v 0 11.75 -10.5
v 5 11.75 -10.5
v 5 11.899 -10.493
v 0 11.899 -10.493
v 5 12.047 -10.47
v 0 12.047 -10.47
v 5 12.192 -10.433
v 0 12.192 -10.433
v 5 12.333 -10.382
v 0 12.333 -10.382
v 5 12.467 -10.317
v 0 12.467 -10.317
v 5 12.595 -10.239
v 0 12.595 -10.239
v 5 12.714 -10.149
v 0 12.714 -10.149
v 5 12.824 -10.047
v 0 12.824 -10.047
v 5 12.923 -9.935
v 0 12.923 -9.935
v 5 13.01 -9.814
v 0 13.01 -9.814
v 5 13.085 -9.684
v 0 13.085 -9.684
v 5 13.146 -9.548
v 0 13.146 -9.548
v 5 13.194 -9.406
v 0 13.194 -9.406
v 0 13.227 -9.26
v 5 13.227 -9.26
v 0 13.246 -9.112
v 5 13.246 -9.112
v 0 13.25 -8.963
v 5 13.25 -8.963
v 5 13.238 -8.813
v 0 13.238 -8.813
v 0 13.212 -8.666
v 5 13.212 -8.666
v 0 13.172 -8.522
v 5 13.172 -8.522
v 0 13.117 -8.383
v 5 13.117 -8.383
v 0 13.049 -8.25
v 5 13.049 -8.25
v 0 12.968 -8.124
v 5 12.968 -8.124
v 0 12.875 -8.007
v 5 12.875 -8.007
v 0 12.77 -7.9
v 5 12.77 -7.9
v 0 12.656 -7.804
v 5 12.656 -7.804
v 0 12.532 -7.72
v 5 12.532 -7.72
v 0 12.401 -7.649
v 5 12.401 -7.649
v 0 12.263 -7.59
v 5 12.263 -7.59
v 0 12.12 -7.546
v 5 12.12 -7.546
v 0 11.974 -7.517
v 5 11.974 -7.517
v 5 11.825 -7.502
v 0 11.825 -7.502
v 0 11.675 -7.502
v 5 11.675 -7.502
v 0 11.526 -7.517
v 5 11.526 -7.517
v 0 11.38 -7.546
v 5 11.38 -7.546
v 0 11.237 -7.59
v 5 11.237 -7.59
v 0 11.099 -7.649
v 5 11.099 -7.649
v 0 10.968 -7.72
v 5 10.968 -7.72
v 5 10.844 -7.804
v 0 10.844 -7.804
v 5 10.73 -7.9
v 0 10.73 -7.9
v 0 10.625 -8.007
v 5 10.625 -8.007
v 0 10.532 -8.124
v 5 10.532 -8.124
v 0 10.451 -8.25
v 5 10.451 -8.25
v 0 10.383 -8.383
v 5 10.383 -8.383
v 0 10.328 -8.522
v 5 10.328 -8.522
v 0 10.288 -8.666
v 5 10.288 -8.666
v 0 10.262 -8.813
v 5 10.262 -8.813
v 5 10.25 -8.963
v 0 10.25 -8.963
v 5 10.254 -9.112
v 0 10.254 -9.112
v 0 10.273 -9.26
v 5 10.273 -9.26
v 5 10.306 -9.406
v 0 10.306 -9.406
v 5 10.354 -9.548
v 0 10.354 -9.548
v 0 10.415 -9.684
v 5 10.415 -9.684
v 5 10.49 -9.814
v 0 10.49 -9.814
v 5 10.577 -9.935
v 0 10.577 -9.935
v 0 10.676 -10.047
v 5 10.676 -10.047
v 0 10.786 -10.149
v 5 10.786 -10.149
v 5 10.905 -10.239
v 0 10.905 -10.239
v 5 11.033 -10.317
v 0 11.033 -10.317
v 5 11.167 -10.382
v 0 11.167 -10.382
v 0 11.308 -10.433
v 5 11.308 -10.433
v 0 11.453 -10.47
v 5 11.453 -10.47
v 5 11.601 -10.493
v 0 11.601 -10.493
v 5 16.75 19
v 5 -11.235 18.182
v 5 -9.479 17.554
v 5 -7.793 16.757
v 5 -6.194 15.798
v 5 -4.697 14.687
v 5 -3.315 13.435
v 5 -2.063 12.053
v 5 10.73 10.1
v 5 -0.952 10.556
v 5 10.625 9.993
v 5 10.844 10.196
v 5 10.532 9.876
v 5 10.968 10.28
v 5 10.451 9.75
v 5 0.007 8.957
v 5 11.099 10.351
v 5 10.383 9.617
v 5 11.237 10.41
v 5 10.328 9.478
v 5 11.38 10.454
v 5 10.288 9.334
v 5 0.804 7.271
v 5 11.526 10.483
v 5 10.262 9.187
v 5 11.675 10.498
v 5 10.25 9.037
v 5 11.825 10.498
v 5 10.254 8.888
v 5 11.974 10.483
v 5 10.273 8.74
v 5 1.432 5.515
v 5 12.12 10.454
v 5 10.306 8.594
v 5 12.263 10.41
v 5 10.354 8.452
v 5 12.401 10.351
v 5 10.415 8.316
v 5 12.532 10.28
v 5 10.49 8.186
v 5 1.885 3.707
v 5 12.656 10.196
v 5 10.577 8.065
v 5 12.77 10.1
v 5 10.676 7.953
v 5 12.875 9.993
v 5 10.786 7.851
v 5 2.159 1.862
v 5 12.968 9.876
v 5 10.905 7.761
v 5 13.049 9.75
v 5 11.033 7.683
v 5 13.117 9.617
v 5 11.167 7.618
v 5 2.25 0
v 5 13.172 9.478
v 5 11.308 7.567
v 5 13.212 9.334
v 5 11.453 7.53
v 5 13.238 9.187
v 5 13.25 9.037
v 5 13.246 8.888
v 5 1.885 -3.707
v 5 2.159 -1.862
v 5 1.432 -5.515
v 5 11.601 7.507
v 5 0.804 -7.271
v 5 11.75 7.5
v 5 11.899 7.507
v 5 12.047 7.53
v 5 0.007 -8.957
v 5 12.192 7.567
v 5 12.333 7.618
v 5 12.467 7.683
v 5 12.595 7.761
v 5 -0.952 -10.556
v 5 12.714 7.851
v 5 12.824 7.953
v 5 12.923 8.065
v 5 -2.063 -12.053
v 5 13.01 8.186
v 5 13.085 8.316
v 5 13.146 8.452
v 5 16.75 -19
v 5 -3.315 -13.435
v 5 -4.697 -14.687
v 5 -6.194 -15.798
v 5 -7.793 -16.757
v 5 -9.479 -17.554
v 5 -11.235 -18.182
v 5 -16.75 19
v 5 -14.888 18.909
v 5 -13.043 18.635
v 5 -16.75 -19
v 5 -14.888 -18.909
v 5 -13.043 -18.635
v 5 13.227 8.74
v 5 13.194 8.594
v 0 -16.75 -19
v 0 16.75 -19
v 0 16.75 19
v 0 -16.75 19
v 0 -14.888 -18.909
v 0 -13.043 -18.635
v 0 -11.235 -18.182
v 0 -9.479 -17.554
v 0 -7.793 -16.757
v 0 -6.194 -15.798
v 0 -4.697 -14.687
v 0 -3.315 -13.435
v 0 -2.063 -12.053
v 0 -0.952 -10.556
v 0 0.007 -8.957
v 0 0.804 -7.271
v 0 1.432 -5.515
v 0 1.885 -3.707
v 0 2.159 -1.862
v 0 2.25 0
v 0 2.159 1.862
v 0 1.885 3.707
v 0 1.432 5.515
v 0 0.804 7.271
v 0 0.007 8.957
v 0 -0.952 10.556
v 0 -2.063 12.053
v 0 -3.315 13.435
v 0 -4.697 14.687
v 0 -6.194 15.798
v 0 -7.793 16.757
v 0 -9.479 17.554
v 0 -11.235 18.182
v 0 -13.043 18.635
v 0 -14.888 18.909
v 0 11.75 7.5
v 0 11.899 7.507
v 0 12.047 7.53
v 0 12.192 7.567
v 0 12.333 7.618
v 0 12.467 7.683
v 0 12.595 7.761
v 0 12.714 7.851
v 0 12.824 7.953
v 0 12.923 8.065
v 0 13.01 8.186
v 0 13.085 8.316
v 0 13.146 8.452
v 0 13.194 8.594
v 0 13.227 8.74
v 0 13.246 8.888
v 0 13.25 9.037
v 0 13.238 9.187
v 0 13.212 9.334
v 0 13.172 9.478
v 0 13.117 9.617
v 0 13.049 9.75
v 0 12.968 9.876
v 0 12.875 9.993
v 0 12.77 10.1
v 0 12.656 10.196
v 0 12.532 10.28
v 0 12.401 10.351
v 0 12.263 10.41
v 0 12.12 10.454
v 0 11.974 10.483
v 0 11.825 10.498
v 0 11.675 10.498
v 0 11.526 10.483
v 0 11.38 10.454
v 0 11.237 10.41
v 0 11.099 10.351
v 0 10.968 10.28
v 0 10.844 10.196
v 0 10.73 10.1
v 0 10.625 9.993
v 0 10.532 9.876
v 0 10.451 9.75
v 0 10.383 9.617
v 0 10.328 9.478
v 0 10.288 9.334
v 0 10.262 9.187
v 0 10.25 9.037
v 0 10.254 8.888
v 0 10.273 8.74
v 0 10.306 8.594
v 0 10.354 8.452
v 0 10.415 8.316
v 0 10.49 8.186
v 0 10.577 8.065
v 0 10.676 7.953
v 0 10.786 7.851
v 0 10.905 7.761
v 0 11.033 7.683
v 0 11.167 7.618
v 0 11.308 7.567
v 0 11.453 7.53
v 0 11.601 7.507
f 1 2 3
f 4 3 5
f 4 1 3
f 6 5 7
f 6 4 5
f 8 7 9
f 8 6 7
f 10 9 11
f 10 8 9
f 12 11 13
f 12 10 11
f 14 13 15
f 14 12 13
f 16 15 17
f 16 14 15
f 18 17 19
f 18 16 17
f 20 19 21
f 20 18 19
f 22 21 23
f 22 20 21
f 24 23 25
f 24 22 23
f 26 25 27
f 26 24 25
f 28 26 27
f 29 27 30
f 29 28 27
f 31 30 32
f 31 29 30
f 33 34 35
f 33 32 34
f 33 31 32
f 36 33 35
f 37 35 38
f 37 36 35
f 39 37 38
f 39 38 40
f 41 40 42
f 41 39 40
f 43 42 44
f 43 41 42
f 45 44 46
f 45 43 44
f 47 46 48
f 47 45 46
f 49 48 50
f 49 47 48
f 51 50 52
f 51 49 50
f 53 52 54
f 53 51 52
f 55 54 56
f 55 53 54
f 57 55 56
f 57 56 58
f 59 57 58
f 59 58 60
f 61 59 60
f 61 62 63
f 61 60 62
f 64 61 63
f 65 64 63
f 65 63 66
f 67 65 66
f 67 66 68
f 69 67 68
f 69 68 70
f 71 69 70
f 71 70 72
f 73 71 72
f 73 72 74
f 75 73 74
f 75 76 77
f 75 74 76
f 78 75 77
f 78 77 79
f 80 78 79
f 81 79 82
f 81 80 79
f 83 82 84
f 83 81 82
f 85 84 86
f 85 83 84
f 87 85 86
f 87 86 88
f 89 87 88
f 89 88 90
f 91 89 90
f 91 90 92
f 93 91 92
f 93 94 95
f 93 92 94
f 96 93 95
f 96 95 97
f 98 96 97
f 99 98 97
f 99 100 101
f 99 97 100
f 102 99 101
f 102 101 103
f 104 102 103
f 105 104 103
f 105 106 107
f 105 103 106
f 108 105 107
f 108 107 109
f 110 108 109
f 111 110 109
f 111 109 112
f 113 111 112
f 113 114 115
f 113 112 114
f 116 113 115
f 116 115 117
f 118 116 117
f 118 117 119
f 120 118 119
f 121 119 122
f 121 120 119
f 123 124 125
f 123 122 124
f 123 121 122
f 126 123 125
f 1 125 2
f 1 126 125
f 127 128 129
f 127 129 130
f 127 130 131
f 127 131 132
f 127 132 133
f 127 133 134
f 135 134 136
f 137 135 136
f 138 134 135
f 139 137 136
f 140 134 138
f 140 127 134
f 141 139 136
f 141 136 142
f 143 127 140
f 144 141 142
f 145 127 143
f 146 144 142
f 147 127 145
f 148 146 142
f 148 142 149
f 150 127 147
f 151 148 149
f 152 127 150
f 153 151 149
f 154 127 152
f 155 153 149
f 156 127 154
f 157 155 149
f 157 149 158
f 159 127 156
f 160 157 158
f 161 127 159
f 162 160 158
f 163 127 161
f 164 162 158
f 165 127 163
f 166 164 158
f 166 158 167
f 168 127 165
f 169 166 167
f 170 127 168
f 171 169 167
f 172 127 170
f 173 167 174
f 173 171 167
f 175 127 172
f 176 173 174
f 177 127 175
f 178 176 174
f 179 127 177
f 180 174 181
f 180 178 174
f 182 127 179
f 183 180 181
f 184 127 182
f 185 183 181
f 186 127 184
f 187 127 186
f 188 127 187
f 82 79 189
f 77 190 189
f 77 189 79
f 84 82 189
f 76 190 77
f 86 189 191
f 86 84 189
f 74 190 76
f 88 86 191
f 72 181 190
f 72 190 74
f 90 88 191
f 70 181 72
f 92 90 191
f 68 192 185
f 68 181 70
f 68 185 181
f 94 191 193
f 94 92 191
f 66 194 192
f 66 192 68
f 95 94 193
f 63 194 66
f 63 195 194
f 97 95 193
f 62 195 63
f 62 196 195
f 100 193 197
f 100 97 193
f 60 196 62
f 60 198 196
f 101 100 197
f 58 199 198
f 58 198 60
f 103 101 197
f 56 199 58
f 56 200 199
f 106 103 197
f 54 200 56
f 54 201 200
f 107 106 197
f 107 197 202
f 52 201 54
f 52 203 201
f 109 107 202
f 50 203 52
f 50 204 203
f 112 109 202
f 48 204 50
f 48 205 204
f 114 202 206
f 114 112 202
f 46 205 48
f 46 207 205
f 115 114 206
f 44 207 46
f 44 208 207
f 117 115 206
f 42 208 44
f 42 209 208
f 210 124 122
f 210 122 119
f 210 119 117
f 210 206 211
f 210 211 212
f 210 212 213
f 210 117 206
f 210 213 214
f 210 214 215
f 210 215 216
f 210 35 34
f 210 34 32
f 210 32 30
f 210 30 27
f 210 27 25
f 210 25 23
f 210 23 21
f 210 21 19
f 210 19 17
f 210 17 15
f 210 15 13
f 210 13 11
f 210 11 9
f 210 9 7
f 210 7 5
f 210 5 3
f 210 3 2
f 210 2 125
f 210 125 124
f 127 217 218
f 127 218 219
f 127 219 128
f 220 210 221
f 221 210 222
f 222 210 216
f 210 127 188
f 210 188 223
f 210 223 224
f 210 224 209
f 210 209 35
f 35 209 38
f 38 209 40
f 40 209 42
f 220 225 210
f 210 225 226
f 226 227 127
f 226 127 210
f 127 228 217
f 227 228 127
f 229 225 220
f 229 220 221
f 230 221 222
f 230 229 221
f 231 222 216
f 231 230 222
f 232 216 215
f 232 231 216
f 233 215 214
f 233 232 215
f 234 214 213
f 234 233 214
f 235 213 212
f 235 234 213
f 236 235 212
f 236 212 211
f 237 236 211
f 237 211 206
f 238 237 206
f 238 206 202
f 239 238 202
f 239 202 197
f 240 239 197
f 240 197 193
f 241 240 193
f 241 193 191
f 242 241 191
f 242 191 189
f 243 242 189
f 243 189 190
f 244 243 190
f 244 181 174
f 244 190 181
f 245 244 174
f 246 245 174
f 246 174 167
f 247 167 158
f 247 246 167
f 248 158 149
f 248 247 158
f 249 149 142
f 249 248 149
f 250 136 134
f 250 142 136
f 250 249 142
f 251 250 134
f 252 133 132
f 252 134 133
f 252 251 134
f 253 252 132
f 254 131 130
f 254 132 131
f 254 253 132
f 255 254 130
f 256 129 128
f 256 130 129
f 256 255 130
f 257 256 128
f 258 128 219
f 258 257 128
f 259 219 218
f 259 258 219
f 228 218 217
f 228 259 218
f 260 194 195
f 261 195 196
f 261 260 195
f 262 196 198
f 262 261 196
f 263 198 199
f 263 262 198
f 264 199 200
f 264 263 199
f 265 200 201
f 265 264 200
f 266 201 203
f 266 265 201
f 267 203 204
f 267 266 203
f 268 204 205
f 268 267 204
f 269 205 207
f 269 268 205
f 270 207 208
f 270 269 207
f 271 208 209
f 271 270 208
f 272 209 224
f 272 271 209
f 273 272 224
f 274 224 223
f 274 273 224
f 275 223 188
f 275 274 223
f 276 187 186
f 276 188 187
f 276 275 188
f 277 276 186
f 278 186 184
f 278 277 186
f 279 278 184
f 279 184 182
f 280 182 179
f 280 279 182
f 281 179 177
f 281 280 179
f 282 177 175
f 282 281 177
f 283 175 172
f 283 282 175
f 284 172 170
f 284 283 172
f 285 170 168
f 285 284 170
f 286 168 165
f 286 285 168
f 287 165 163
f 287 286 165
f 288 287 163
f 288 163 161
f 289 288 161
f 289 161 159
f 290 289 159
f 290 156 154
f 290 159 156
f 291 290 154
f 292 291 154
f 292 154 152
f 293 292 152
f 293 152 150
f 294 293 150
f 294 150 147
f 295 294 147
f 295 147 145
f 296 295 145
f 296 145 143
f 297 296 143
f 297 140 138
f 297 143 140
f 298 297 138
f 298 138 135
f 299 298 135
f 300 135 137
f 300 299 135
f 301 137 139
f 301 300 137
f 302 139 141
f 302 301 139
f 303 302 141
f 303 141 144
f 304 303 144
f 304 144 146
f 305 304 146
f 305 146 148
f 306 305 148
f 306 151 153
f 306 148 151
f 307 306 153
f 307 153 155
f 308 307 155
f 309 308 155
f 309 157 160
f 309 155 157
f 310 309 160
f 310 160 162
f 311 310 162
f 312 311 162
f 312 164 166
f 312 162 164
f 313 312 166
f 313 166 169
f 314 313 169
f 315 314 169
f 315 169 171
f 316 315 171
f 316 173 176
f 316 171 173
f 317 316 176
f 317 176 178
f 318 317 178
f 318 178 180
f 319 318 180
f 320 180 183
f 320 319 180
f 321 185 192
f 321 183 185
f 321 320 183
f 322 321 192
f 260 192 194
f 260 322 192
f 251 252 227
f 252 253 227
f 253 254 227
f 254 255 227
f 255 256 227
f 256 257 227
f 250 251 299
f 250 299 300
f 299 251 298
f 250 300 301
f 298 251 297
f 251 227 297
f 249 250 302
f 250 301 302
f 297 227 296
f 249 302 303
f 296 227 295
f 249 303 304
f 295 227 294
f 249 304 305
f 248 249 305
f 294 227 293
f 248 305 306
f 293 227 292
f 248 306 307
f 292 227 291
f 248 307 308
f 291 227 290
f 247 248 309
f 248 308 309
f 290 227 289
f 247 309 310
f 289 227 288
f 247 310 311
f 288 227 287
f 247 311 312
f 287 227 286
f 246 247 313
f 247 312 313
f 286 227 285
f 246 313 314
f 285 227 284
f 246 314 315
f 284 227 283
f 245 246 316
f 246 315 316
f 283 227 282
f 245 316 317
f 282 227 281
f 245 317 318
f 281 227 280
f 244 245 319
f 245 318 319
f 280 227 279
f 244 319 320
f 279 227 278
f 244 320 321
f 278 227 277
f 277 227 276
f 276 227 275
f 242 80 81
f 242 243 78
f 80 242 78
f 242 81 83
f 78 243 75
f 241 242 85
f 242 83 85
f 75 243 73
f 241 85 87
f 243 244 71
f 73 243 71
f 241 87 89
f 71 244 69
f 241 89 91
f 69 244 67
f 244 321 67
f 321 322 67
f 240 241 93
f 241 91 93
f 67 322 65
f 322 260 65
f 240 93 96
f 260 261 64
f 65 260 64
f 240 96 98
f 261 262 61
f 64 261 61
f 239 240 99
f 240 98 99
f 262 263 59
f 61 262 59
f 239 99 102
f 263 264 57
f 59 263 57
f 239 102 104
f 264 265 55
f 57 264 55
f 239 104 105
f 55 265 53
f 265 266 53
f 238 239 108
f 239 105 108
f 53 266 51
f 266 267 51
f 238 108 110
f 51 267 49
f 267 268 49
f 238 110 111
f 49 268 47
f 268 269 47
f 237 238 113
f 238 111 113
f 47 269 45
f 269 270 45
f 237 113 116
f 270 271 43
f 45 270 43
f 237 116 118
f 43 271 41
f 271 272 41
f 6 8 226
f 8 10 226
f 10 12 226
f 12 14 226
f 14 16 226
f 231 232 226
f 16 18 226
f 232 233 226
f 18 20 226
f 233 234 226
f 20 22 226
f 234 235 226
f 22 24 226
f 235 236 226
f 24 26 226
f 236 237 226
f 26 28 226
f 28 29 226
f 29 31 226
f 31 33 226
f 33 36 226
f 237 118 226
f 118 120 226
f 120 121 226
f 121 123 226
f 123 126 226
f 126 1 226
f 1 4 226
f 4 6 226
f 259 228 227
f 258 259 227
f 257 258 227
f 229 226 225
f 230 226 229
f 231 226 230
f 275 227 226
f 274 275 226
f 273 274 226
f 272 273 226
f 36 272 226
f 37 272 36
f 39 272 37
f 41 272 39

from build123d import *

# Parameters (mm, degrees)
SCHIZZO1_W                   = 38
SCHIZZO1_H                   = 33.5
ESTRUSIONE_ESTRUSIONE1_DEPTH = 5
SCHIZZO2_R                   = 19
SCHIZZO2_R_2                 = 1.5
TAGLIO_ESTRUSIONE1_DEPTH     = 6


with BuildPart() as part:
    # Schizzo1 → Estrusione-Estrusione1 (new body)
    with BuildSketch(Plane(origin=(0, 0, 0), x_dir=(0, 0, -1), z_dir=(1, 0, 0))):
        Rectangle(SCHIZZO1_W, SCHIZZO1_H)
    extrude(amount=ESTRUSIONE_ESTRUSIONE1_DEPTH)

    # Schizzo2 → Taglio-Estrusione1 (cut, through all)
    with BuildSketch(Plane(origin=(0, 0, 0), x_dir=(0, 0, -1), z_dir=(1, 0, 0))):
        with Locations((0, -16.75)):
            Circle(SCHIZZO2_R)
        with Locations((-9, 11.75)):
            Circle(SCHIZZO2_R_2)
        with Locations((9, 11.75)):
            Circle(SCHIZZO2_R_2)
    extrude(amount=TAGLIO_ESTRUSIONE1_DEPTH, mode=Mode.SUBTRACT)


solid = part.part
